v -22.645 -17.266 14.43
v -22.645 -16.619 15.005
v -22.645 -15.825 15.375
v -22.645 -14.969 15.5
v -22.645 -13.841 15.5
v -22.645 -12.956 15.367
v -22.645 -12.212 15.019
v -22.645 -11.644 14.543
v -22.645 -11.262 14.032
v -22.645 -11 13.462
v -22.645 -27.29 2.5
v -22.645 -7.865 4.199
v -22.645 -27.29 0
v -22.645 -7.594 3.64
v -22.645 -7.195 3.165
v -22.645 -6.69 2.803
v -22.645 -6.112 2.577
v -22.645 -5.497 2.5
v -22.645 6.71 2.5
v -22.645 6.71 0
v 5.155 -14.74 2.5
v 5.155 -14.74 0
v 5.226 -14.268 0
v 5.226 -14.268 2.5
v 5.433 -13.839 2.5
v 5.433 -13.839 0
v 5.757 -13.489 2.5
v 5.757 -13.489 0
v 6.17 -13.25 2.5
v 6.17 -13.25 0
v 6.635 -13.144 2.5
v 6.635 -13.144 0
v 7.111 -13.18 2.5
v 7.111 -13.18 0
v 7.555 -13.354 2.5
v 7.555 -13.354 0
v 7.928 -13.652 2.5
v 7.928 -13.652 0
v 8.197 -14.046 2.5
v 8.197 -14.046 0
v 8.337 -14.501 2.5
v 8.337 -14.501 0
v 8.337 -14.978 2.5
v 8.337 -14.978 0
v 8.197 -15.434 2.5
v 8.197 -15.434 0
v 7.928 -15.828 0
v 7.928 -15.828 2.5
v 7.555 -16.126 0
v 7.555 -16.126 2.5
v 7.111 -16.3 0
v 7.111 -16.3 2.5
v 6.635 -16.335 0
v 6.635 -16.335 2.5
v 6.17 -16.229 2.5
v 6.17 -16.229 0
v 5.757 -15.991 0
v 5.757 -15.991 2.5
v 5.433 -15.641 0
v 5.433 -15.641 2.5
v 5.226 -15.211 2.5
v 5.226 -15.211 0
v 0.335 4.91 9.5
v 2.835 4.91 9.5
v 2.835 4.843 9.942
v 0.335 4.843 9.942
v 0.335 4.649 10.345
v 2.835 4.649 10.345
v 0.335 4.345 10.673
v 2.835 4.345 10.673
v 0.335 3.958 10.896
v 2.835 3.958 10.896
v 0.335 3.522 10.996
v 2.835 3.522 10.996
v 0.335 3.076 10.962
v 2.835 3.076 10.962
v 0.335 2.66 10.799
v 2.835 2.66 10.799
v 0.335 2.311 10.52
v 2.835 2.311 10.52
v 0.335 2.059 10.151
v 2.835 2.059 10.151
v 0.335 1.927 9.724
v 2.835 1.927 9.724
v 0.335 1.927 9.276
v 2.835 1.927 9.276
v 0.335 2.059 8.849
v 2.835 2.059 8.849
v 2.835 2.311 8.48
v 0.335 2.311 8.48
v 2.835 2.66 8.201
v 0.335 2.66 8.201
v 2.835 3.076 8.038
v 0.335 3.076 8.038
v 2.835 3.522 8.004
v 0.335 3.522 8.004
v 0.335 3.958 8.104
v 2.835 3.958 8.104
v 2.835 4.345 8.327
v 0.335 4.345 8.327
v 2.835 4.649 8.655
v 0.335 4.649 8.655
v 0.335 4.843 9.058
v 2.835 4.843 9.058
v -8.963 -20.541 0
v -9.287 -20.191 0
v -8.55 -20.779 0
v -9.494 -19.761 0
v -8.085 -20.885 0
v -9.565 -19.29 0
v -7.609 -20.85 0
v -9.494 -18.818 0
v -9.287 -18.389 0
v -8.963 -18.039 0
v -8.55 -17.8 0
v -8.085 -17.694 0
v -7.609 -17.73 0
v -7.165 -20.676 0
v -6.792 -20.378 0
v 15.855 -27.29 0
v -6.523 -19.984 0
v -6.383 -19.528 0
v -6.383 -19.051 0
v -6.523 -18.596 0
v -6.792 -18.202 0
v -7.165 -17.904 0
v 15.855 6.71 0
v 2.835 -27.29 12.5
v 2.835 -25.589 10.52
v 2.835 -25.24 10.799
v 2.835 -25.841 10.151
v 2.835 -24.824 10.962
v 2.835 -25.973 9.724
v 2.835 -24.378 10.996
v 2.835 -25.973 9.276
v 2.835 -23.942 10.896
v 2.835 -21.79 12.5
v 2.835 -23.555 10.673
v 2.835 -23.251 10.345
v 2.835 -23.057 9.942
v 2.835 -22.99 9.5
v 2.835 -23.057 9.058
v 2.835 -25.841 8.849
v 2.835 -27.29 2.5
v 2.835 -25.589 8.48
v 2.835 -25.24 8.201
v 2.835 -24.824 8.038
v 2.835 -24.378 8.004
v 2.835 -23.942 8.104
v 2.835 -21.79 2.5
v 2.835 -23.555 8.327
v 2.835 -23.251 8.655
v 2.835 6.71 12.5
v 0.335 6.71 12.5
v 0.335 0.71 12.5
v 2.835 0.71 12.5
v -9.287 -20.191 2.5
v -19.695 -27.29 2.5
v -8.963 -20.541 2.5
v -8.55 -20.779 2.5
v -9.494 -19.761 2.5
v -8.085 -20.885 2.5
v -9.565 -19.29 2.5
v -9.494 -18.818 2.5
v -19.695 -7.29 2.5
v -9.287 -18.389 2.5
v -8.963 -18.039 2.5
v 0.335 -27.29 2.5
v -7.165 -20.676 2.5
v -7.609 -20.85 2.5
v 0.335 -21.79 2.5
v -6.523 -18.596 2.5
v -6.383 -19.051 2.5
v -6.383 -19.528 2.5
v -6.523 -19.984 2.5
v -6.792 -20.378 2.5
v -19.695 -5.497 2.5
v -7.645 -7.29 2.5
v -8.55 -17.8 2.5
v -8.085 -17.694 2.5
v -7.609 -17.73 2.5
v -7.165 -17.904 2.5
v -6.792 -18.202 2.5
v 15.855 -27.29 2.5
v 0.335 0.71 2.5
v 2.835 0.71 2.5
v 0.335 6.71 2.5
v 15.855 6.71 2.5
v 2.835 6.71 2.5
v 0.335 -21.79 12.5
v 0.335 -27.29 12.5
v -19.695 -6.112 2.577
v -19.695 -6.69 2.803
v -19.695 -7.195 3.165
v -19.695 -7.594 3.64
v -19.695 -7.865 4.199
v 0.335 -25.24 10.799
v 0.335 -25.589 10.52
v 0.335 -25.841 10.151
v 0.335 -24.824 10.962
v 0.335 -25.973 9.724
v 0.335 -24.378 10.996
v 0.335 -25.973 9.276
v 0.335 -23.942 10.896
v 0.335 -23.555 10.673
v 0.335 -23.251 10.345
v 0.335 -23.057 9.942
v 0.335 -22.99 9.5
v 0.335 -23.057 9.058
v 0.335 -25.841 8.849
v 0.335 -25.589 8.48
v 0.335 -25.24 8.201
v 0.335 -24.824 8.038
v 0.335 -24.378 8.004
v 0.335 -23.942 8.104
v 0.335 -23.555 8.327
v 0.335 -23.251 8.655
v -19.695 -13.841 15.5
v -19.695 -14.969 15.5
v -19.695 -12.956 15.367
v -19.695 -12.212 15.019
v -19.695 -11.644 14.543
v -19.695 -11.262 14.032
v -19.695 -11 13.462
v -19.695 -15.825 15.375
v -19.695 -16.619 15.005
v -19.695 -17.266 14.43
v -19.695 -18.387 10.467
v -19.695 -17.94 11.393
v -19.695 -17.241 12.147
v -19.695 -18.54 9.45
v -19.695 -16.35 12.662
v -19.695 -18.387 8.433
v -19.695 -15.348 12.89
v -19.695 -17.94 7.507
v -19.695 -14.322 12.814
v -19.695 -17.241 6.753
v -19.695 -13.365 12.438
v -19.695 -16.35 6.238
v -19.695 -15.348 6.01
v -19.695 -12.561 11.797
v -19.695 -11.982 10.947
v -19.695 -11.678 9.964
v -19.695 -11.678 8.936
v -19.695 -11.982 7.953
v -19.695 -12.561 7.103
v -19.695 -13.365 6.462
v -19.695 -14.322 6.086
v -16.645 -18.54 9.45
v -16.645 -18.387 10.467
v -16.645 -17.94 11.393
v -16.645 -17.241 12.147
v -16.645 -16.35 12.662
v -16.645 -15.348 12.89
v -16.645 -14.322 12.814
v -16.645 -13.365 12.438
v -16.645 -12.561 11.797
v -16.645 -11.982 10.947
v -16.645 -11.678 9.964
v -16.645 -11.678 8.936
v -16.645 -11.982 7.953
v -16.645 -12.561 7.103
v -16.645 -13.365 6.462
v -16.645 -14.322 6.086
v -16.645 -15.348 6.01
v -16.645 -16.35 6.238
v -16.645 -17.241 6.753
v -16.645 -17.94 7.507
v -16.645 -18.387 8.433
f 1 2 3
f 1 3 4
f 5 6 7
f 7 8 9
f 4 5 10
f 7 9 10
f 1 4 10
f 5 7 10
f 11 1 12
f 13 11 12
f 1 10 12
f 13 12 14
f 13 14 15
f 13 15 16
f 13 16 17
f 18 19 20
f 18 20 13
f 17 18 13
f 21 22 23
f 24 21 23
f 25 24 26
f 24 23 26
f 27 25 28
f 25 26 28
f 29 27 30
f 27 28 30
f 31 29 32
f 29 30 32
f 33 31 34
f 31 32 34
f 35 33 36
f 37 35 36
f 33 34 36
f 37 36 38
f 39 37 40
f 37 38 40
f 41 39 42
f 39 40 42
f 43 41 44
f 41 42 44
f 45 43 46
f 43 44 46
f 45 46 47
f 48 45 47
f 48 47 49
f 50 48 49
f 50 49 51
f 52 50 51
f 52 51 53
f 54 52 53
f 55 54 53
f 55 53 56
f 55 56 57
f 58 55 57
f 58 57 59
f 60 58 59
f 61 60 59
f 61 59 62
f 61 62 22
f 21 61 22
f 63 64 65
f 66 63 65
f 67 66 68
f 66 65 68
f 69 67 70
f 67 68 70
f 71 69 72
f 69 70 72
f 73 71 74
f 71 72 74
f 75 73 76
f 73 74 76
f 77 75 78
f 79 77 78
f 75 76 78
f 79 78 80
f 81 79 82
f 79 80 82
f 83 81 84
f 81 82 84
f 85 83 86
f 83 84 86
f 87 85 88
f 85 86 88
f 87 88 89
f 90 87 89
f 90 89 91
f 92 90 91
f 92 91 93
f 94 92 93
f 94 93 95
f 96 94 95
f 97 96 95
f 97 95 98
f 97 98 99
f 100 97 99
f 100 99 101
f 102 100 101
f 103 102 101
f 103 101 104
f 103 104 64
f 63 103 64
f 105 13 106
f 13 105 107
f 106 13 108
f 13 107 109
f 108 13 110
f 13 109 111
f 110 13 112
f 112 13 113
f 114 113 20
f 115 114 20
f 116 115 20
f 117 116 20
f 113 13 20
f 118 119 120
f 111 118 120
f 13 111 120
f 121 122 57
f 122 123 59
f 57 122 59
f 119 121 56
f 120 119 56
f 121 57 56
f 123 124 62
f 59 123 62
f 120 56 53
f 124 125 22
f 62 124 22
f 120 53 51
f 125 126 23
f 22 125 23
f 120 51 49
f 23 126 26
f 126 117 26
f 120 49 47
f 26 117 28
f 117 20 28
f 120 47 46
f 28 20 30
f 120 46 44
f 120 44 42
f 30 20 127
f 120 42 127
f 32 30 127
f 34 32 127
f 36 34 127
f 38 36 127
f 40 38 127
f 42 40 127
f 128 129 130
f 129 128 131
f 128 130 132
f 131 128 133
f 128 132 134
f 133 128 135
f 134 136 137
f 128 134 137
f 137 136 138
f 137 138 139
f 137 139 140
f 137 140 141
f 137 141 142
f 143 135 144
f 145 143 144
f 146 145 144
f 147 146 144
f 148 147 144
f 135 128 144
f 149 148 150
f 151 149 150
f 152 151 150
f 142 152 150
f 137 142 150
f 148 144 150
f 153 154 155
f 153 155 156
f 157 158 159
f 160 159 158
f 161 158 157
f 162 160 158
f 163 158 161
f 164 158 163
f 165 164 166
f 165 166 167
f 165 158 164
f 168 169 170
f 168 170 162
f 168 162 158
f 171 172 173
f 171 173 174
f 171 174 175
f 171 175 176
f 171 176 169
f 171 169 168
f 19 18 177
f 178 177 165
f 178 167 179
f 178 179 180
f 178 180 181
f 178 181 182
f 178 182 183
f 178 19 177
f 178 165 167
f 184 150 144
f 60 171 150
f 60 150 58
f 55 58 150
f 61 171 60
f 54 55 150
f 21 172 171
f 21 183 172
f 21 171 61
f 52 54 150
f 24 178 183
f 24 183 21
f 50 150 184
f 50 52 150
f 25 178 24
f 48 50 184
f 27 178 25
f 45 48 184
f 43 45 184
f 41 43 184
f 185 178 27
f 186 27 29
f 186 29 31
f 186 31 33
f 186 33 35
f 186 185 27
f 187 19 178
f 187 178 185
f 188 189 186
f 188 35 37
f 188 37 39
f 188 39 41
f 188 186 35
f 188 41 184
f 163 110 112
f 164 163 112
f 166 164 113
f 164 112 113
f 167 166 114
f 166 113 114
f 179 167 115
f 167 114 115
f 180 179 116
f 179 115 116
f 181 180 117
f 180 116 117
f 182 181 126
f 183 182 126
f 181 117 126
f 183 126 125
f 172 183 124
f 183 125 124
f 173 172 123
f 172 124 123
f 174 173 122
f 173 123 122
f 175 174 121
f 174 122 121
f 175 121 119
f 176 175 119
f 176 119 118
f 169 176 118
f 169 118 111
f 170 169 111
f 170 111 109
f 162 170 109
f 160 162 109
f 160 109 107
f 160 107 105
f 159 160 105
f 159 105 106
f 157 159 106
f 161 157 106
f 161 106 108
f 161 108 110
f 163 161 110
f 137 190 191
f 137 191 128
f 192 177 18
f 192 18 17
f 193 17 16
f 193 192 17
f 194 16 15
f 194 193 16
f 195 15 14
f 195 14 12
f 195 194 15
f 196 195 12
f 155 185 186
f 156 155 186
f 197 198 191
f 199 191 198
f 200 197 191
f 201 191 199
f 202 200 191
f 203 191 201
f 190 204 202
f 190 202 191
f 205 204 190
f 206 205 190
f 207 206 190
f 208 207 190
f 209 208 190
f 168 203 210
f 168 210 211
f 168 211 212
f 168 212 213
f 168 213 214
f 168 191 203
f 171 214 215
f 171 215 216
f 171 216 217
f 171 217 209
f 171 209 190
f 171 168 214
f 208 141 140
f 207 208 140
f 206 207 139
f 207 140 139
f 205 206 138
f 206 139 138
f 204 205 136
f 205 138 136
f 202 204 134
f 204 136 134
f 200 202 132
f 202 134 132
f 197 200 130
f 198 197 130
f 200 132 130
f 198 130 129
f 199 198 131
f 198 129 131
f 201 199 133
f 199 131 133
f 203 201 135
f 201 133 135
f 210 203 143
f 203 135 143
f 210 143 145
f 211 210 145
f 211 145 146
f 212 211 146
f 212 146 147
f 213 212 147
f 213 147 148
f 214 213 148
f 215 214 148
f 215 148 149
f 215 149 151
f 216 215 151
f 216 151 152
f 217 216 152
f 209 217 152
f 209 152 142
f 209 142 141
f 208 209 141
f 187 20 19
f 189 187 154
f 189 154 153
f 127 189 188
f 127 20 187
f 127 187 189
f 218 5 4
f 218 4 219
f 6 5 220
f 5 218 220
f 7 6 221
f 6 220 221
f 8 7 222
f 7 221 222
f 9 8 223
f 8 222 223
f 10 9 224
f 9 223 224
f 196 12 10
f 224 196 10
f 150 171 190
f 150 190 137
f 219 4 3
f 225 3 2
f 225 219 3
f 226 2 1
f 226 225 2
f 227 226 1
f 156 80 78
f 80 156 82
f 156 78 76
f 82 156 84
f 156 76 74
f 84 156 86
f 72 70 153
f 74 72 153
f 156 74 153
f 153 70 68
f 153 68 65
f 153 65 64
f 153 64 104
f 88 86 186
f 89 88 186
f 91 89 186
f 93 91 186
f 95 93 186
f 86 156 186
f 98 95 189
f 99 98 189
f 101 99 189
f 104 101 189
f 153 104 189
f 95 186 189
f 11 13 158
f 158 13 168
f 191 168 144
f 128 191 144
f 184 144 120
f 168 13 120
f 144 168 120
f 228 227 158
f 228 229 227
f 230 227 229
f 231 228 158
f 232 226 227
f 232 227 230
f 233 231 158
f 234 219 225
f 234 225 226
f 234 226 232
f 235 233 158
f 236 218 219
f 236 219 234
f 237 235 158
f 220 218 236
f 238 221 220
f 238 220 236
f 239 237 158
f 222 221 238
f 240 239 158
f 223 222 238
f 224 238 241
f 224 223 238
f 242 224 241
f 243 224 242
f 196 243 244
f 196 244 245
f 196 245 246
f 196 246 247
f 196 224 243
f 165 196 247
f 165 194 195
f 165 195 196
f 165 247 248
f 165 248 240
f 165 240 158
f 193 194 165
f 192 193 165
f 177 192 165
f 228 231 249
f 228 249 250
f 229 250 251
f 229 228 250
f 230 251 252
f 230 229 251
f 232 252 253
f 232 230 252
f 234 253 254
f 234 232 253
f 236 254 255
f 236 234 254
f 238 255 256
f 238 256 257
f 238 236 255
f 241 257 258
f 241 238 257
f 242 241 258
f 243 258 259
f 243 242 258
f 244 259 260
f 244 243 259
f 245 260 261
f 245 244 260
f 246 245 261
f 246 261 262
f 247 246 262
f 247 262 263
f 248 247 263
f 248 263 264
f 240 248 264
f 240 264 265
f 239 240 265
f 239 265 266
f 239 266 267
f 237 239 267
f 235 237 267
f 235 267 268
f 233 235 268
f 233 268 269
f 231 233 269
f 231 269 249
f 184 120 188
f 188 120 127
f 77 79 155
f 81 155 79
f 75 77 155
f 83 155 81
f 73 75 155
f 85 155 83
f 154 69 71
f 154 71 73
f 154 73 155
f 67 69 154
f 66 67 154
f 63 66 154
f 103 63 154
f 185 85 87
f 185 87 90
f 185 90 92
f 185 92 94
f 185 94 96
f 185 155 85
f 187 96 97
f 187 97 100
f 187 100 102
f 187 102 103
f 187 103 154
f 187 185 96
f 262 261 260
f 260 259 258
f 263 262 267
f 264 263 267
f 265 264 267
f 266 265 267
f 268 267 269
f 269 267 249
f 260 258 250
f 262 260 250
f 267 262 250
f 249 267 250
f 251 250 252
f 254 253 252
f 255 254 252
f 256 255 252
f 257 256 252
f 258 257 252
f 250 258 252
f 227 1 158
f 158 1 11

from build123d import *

# Parameters (mm, degrees)
ESBO_O1_W                = 38.5
ESBO_O1_H                = 34
RESSALTO_EXTRUS_O1_DEPTH = 2.5
ESBO_O2_W                = 2.5
ESBO_O2_H                = 6
ESBO_O2_H_2              = 5.5
RESSALTO_EXTRUS_O2_DEPTH = 10
CORTE_EXTRUS_O1_REACH    = 41.373
ESBO_O3_R                = 1.5
ESBO_O4_W                = 2.95
ESBO_O4_H                = 20
RESSALTO_EXTRUS_O3_DEPTH = 13
ESBO_O5_R                = 3.45
CORTE_EXTRUS_O2_DEPTH    = 15
FILETE1_R                = 3
FILETE2_R                = 2.5
ESBO_O7_R                = 3.45
RESSALTO_EXTRUS_O5_DEPTH = 6
ESBO_O8_R                = 1.6
CORTE_EXTRUS_O3_DEPTH    = 6


with BuildPart() as part:
    # Esboço1 → Ressalto-extrusão1 (new body)
    with BuildSketch(Plane.XY):
        with Locations((-3.395014232, -10.289862205)):
            Rectangle(ESBO_O1_W, ESBO_O1_H)
    extrude(amount=RESSALTO_EXTRUS_O1_DEPTH)

    # Esboço2 → Ressalto-extrusão2 (add)
    with BuildSketch(Plane.XY.offset(2.5)):
        with Locations((1.584985768, 3.710137795)):
            Rectangle(ESBO_O2_W, ESBO_O2_H)
        with Locations((1.584985768, -24.539862205)):
            Rectangle(ESBO_O2_W, ESBO_O2_H_2)
    extrude(amount=RESSALTO_EXTRUS_O2_DEPTH)

    # Esboço3 → Corte-extrusão1 (cut, up to next)
    with BuildSketch(Plane(origin=(2.834985768, 0, 0), x_dir=(0, 0, -1), z_dir=(1, 0, 0)), mode=Mode.PRIVATE) as corte_extrus_o1_sk1:
        with Locations(Location((-9.5, 3.410137795, 0), (0, 0, 90))):
            Circle(ESBO_O3_R)
    corte_extrus_o1_tool1 = extrude(corte_extrus_o1_sk1.sketch, amount=-CORTE_EXTRUS_O1_REACH, mode=Mode.PRIVATE) & part.part
    # Esboço3 → Corte-extrusão1 (cut, up to next)
    with BuildSketch(Plane(origin=(2.834985768, 0, 0), x_dir=(0, 0, -1), z_dir=(1, 0, 0)), mode=Mode.PRIVATE) as corte_extrus_o1_sk2:
        with Locations(Location((-9.5, -24.489862205, 0), (0, 0, 90))):
            Circle(ESBO_O3_R)
    corte_extrus_o1_tool2 = extrude(corte_extrus_o1_sk2.sketch, amount=-CORTE_EXTRUS_O1_REACH, mode=Mode.PRIVATE) & part.part
    add(corte_extrus_o1_tool1.solids().sort_by_distance((2.834986, 3.410138, 9.5))[0], mode=Mode.SUBTRACT)
    add(corte_extrus_o1_tool2.solids().sort_by_distance((2.834986, -24.489862, 9.5))[0], mode=Mode.SUBTRACT)

    # Esboço4 → Ressalto-extrusão3 (add)
    with BuildSketch(Plane.XY.offset(2.5)):
        with Locations((-21.170014232, -17.289862205)):
            Rectangle(ESBO_O4_W, ESBO_O4_H)
    extrude(amount=RESSALTO_EXTRUS_O3_DEPTH)

    # Esboço5 → Corte-extrusão2 (cut)
    with BuildSketch(Plane.ZY.offset(22.645014232)):
        Polygon((2.5, -7.289862205), (15.222036194, -11.595443281), (15.5, -11.689515935), (15.5, -7.289862205), align=None)
        Polygon((15.222036194, -16.59994967), (2.5, -27.289862205), (15.5, -27.289862205), (15.5, -16.36638574), align=None)
        with Locations(Location((9.45, -15.089862205, 0), (0, 0, 270))):
            Circle(ESBO_O5_R)
    extrude(amount=-CORTE_EXTRUS_O2_DEPTH, mode=Mode.SUBTRACT)

    # Filete1
    filete1_edges = [part.edges().sort_by_distance(p)[0] for p in [
        (-21.170014232, -11.689515935, 15.5),
        (-21.170014232, -16.36638574, 15.5),
    ]]
    fillet(filete1_edges, radius=FILETE1_R)

    # Filete2
    # the kernel refuses this fillet: 2.5 mm, written as the material it adds along each edge
    with BuildSketch(Plane(origin=(-19.695014232, -7.289862205, 2.5), x_dir=(0, -0.32057353707536407, 0.947223631106715), z_dir=(-1, 0, 0))) as filete2_piece_1:
        with BuildLine():
            CenterArc((FILETE2_R * 0.717282002488, FILETE2_R), FILETE2_R, 198.697613514, 71.302386486)
            Line((-FILETE2_R * 0.229941628618, FILETE2_R * 0.679426462925), (0, 0))
            Line((0, 0), (FILETE2_R * 0.717282002488, 0))
        make_face()
    extrude(amount=2.95)

    # Esboço7 → Ressalto-extrusão5 (add)
    with BuildSketch(Plane.ZY.offset(22.645014232)):
        with Locations(Location((9.45, -15.089862205, 0), (0, 0, 270))):
            Circle(ESBO_O7_R)
    extrude(amount=-RESSALTO_EXTRUS_O5_DEPTH)

    # Esboço8 → Corte-extrusão3 (cut)
    with BuildSketch(Plane(origin=(0, 0, 0), x_dir=(-1, 0, 0), z_dir=(0, 0, -1))):
        with Locations((7.965014232, -19.289862205)):
            Circle(ESBO_O8_R)
        with Locations((-6.754985768, -14.739862205)):
            Circle(ESBO_O8_R)
    extrude(amount=-CORTE_EXTRUS_O3_DEPTH, mode=Mode.SUBTRACT)


solid = part.part
